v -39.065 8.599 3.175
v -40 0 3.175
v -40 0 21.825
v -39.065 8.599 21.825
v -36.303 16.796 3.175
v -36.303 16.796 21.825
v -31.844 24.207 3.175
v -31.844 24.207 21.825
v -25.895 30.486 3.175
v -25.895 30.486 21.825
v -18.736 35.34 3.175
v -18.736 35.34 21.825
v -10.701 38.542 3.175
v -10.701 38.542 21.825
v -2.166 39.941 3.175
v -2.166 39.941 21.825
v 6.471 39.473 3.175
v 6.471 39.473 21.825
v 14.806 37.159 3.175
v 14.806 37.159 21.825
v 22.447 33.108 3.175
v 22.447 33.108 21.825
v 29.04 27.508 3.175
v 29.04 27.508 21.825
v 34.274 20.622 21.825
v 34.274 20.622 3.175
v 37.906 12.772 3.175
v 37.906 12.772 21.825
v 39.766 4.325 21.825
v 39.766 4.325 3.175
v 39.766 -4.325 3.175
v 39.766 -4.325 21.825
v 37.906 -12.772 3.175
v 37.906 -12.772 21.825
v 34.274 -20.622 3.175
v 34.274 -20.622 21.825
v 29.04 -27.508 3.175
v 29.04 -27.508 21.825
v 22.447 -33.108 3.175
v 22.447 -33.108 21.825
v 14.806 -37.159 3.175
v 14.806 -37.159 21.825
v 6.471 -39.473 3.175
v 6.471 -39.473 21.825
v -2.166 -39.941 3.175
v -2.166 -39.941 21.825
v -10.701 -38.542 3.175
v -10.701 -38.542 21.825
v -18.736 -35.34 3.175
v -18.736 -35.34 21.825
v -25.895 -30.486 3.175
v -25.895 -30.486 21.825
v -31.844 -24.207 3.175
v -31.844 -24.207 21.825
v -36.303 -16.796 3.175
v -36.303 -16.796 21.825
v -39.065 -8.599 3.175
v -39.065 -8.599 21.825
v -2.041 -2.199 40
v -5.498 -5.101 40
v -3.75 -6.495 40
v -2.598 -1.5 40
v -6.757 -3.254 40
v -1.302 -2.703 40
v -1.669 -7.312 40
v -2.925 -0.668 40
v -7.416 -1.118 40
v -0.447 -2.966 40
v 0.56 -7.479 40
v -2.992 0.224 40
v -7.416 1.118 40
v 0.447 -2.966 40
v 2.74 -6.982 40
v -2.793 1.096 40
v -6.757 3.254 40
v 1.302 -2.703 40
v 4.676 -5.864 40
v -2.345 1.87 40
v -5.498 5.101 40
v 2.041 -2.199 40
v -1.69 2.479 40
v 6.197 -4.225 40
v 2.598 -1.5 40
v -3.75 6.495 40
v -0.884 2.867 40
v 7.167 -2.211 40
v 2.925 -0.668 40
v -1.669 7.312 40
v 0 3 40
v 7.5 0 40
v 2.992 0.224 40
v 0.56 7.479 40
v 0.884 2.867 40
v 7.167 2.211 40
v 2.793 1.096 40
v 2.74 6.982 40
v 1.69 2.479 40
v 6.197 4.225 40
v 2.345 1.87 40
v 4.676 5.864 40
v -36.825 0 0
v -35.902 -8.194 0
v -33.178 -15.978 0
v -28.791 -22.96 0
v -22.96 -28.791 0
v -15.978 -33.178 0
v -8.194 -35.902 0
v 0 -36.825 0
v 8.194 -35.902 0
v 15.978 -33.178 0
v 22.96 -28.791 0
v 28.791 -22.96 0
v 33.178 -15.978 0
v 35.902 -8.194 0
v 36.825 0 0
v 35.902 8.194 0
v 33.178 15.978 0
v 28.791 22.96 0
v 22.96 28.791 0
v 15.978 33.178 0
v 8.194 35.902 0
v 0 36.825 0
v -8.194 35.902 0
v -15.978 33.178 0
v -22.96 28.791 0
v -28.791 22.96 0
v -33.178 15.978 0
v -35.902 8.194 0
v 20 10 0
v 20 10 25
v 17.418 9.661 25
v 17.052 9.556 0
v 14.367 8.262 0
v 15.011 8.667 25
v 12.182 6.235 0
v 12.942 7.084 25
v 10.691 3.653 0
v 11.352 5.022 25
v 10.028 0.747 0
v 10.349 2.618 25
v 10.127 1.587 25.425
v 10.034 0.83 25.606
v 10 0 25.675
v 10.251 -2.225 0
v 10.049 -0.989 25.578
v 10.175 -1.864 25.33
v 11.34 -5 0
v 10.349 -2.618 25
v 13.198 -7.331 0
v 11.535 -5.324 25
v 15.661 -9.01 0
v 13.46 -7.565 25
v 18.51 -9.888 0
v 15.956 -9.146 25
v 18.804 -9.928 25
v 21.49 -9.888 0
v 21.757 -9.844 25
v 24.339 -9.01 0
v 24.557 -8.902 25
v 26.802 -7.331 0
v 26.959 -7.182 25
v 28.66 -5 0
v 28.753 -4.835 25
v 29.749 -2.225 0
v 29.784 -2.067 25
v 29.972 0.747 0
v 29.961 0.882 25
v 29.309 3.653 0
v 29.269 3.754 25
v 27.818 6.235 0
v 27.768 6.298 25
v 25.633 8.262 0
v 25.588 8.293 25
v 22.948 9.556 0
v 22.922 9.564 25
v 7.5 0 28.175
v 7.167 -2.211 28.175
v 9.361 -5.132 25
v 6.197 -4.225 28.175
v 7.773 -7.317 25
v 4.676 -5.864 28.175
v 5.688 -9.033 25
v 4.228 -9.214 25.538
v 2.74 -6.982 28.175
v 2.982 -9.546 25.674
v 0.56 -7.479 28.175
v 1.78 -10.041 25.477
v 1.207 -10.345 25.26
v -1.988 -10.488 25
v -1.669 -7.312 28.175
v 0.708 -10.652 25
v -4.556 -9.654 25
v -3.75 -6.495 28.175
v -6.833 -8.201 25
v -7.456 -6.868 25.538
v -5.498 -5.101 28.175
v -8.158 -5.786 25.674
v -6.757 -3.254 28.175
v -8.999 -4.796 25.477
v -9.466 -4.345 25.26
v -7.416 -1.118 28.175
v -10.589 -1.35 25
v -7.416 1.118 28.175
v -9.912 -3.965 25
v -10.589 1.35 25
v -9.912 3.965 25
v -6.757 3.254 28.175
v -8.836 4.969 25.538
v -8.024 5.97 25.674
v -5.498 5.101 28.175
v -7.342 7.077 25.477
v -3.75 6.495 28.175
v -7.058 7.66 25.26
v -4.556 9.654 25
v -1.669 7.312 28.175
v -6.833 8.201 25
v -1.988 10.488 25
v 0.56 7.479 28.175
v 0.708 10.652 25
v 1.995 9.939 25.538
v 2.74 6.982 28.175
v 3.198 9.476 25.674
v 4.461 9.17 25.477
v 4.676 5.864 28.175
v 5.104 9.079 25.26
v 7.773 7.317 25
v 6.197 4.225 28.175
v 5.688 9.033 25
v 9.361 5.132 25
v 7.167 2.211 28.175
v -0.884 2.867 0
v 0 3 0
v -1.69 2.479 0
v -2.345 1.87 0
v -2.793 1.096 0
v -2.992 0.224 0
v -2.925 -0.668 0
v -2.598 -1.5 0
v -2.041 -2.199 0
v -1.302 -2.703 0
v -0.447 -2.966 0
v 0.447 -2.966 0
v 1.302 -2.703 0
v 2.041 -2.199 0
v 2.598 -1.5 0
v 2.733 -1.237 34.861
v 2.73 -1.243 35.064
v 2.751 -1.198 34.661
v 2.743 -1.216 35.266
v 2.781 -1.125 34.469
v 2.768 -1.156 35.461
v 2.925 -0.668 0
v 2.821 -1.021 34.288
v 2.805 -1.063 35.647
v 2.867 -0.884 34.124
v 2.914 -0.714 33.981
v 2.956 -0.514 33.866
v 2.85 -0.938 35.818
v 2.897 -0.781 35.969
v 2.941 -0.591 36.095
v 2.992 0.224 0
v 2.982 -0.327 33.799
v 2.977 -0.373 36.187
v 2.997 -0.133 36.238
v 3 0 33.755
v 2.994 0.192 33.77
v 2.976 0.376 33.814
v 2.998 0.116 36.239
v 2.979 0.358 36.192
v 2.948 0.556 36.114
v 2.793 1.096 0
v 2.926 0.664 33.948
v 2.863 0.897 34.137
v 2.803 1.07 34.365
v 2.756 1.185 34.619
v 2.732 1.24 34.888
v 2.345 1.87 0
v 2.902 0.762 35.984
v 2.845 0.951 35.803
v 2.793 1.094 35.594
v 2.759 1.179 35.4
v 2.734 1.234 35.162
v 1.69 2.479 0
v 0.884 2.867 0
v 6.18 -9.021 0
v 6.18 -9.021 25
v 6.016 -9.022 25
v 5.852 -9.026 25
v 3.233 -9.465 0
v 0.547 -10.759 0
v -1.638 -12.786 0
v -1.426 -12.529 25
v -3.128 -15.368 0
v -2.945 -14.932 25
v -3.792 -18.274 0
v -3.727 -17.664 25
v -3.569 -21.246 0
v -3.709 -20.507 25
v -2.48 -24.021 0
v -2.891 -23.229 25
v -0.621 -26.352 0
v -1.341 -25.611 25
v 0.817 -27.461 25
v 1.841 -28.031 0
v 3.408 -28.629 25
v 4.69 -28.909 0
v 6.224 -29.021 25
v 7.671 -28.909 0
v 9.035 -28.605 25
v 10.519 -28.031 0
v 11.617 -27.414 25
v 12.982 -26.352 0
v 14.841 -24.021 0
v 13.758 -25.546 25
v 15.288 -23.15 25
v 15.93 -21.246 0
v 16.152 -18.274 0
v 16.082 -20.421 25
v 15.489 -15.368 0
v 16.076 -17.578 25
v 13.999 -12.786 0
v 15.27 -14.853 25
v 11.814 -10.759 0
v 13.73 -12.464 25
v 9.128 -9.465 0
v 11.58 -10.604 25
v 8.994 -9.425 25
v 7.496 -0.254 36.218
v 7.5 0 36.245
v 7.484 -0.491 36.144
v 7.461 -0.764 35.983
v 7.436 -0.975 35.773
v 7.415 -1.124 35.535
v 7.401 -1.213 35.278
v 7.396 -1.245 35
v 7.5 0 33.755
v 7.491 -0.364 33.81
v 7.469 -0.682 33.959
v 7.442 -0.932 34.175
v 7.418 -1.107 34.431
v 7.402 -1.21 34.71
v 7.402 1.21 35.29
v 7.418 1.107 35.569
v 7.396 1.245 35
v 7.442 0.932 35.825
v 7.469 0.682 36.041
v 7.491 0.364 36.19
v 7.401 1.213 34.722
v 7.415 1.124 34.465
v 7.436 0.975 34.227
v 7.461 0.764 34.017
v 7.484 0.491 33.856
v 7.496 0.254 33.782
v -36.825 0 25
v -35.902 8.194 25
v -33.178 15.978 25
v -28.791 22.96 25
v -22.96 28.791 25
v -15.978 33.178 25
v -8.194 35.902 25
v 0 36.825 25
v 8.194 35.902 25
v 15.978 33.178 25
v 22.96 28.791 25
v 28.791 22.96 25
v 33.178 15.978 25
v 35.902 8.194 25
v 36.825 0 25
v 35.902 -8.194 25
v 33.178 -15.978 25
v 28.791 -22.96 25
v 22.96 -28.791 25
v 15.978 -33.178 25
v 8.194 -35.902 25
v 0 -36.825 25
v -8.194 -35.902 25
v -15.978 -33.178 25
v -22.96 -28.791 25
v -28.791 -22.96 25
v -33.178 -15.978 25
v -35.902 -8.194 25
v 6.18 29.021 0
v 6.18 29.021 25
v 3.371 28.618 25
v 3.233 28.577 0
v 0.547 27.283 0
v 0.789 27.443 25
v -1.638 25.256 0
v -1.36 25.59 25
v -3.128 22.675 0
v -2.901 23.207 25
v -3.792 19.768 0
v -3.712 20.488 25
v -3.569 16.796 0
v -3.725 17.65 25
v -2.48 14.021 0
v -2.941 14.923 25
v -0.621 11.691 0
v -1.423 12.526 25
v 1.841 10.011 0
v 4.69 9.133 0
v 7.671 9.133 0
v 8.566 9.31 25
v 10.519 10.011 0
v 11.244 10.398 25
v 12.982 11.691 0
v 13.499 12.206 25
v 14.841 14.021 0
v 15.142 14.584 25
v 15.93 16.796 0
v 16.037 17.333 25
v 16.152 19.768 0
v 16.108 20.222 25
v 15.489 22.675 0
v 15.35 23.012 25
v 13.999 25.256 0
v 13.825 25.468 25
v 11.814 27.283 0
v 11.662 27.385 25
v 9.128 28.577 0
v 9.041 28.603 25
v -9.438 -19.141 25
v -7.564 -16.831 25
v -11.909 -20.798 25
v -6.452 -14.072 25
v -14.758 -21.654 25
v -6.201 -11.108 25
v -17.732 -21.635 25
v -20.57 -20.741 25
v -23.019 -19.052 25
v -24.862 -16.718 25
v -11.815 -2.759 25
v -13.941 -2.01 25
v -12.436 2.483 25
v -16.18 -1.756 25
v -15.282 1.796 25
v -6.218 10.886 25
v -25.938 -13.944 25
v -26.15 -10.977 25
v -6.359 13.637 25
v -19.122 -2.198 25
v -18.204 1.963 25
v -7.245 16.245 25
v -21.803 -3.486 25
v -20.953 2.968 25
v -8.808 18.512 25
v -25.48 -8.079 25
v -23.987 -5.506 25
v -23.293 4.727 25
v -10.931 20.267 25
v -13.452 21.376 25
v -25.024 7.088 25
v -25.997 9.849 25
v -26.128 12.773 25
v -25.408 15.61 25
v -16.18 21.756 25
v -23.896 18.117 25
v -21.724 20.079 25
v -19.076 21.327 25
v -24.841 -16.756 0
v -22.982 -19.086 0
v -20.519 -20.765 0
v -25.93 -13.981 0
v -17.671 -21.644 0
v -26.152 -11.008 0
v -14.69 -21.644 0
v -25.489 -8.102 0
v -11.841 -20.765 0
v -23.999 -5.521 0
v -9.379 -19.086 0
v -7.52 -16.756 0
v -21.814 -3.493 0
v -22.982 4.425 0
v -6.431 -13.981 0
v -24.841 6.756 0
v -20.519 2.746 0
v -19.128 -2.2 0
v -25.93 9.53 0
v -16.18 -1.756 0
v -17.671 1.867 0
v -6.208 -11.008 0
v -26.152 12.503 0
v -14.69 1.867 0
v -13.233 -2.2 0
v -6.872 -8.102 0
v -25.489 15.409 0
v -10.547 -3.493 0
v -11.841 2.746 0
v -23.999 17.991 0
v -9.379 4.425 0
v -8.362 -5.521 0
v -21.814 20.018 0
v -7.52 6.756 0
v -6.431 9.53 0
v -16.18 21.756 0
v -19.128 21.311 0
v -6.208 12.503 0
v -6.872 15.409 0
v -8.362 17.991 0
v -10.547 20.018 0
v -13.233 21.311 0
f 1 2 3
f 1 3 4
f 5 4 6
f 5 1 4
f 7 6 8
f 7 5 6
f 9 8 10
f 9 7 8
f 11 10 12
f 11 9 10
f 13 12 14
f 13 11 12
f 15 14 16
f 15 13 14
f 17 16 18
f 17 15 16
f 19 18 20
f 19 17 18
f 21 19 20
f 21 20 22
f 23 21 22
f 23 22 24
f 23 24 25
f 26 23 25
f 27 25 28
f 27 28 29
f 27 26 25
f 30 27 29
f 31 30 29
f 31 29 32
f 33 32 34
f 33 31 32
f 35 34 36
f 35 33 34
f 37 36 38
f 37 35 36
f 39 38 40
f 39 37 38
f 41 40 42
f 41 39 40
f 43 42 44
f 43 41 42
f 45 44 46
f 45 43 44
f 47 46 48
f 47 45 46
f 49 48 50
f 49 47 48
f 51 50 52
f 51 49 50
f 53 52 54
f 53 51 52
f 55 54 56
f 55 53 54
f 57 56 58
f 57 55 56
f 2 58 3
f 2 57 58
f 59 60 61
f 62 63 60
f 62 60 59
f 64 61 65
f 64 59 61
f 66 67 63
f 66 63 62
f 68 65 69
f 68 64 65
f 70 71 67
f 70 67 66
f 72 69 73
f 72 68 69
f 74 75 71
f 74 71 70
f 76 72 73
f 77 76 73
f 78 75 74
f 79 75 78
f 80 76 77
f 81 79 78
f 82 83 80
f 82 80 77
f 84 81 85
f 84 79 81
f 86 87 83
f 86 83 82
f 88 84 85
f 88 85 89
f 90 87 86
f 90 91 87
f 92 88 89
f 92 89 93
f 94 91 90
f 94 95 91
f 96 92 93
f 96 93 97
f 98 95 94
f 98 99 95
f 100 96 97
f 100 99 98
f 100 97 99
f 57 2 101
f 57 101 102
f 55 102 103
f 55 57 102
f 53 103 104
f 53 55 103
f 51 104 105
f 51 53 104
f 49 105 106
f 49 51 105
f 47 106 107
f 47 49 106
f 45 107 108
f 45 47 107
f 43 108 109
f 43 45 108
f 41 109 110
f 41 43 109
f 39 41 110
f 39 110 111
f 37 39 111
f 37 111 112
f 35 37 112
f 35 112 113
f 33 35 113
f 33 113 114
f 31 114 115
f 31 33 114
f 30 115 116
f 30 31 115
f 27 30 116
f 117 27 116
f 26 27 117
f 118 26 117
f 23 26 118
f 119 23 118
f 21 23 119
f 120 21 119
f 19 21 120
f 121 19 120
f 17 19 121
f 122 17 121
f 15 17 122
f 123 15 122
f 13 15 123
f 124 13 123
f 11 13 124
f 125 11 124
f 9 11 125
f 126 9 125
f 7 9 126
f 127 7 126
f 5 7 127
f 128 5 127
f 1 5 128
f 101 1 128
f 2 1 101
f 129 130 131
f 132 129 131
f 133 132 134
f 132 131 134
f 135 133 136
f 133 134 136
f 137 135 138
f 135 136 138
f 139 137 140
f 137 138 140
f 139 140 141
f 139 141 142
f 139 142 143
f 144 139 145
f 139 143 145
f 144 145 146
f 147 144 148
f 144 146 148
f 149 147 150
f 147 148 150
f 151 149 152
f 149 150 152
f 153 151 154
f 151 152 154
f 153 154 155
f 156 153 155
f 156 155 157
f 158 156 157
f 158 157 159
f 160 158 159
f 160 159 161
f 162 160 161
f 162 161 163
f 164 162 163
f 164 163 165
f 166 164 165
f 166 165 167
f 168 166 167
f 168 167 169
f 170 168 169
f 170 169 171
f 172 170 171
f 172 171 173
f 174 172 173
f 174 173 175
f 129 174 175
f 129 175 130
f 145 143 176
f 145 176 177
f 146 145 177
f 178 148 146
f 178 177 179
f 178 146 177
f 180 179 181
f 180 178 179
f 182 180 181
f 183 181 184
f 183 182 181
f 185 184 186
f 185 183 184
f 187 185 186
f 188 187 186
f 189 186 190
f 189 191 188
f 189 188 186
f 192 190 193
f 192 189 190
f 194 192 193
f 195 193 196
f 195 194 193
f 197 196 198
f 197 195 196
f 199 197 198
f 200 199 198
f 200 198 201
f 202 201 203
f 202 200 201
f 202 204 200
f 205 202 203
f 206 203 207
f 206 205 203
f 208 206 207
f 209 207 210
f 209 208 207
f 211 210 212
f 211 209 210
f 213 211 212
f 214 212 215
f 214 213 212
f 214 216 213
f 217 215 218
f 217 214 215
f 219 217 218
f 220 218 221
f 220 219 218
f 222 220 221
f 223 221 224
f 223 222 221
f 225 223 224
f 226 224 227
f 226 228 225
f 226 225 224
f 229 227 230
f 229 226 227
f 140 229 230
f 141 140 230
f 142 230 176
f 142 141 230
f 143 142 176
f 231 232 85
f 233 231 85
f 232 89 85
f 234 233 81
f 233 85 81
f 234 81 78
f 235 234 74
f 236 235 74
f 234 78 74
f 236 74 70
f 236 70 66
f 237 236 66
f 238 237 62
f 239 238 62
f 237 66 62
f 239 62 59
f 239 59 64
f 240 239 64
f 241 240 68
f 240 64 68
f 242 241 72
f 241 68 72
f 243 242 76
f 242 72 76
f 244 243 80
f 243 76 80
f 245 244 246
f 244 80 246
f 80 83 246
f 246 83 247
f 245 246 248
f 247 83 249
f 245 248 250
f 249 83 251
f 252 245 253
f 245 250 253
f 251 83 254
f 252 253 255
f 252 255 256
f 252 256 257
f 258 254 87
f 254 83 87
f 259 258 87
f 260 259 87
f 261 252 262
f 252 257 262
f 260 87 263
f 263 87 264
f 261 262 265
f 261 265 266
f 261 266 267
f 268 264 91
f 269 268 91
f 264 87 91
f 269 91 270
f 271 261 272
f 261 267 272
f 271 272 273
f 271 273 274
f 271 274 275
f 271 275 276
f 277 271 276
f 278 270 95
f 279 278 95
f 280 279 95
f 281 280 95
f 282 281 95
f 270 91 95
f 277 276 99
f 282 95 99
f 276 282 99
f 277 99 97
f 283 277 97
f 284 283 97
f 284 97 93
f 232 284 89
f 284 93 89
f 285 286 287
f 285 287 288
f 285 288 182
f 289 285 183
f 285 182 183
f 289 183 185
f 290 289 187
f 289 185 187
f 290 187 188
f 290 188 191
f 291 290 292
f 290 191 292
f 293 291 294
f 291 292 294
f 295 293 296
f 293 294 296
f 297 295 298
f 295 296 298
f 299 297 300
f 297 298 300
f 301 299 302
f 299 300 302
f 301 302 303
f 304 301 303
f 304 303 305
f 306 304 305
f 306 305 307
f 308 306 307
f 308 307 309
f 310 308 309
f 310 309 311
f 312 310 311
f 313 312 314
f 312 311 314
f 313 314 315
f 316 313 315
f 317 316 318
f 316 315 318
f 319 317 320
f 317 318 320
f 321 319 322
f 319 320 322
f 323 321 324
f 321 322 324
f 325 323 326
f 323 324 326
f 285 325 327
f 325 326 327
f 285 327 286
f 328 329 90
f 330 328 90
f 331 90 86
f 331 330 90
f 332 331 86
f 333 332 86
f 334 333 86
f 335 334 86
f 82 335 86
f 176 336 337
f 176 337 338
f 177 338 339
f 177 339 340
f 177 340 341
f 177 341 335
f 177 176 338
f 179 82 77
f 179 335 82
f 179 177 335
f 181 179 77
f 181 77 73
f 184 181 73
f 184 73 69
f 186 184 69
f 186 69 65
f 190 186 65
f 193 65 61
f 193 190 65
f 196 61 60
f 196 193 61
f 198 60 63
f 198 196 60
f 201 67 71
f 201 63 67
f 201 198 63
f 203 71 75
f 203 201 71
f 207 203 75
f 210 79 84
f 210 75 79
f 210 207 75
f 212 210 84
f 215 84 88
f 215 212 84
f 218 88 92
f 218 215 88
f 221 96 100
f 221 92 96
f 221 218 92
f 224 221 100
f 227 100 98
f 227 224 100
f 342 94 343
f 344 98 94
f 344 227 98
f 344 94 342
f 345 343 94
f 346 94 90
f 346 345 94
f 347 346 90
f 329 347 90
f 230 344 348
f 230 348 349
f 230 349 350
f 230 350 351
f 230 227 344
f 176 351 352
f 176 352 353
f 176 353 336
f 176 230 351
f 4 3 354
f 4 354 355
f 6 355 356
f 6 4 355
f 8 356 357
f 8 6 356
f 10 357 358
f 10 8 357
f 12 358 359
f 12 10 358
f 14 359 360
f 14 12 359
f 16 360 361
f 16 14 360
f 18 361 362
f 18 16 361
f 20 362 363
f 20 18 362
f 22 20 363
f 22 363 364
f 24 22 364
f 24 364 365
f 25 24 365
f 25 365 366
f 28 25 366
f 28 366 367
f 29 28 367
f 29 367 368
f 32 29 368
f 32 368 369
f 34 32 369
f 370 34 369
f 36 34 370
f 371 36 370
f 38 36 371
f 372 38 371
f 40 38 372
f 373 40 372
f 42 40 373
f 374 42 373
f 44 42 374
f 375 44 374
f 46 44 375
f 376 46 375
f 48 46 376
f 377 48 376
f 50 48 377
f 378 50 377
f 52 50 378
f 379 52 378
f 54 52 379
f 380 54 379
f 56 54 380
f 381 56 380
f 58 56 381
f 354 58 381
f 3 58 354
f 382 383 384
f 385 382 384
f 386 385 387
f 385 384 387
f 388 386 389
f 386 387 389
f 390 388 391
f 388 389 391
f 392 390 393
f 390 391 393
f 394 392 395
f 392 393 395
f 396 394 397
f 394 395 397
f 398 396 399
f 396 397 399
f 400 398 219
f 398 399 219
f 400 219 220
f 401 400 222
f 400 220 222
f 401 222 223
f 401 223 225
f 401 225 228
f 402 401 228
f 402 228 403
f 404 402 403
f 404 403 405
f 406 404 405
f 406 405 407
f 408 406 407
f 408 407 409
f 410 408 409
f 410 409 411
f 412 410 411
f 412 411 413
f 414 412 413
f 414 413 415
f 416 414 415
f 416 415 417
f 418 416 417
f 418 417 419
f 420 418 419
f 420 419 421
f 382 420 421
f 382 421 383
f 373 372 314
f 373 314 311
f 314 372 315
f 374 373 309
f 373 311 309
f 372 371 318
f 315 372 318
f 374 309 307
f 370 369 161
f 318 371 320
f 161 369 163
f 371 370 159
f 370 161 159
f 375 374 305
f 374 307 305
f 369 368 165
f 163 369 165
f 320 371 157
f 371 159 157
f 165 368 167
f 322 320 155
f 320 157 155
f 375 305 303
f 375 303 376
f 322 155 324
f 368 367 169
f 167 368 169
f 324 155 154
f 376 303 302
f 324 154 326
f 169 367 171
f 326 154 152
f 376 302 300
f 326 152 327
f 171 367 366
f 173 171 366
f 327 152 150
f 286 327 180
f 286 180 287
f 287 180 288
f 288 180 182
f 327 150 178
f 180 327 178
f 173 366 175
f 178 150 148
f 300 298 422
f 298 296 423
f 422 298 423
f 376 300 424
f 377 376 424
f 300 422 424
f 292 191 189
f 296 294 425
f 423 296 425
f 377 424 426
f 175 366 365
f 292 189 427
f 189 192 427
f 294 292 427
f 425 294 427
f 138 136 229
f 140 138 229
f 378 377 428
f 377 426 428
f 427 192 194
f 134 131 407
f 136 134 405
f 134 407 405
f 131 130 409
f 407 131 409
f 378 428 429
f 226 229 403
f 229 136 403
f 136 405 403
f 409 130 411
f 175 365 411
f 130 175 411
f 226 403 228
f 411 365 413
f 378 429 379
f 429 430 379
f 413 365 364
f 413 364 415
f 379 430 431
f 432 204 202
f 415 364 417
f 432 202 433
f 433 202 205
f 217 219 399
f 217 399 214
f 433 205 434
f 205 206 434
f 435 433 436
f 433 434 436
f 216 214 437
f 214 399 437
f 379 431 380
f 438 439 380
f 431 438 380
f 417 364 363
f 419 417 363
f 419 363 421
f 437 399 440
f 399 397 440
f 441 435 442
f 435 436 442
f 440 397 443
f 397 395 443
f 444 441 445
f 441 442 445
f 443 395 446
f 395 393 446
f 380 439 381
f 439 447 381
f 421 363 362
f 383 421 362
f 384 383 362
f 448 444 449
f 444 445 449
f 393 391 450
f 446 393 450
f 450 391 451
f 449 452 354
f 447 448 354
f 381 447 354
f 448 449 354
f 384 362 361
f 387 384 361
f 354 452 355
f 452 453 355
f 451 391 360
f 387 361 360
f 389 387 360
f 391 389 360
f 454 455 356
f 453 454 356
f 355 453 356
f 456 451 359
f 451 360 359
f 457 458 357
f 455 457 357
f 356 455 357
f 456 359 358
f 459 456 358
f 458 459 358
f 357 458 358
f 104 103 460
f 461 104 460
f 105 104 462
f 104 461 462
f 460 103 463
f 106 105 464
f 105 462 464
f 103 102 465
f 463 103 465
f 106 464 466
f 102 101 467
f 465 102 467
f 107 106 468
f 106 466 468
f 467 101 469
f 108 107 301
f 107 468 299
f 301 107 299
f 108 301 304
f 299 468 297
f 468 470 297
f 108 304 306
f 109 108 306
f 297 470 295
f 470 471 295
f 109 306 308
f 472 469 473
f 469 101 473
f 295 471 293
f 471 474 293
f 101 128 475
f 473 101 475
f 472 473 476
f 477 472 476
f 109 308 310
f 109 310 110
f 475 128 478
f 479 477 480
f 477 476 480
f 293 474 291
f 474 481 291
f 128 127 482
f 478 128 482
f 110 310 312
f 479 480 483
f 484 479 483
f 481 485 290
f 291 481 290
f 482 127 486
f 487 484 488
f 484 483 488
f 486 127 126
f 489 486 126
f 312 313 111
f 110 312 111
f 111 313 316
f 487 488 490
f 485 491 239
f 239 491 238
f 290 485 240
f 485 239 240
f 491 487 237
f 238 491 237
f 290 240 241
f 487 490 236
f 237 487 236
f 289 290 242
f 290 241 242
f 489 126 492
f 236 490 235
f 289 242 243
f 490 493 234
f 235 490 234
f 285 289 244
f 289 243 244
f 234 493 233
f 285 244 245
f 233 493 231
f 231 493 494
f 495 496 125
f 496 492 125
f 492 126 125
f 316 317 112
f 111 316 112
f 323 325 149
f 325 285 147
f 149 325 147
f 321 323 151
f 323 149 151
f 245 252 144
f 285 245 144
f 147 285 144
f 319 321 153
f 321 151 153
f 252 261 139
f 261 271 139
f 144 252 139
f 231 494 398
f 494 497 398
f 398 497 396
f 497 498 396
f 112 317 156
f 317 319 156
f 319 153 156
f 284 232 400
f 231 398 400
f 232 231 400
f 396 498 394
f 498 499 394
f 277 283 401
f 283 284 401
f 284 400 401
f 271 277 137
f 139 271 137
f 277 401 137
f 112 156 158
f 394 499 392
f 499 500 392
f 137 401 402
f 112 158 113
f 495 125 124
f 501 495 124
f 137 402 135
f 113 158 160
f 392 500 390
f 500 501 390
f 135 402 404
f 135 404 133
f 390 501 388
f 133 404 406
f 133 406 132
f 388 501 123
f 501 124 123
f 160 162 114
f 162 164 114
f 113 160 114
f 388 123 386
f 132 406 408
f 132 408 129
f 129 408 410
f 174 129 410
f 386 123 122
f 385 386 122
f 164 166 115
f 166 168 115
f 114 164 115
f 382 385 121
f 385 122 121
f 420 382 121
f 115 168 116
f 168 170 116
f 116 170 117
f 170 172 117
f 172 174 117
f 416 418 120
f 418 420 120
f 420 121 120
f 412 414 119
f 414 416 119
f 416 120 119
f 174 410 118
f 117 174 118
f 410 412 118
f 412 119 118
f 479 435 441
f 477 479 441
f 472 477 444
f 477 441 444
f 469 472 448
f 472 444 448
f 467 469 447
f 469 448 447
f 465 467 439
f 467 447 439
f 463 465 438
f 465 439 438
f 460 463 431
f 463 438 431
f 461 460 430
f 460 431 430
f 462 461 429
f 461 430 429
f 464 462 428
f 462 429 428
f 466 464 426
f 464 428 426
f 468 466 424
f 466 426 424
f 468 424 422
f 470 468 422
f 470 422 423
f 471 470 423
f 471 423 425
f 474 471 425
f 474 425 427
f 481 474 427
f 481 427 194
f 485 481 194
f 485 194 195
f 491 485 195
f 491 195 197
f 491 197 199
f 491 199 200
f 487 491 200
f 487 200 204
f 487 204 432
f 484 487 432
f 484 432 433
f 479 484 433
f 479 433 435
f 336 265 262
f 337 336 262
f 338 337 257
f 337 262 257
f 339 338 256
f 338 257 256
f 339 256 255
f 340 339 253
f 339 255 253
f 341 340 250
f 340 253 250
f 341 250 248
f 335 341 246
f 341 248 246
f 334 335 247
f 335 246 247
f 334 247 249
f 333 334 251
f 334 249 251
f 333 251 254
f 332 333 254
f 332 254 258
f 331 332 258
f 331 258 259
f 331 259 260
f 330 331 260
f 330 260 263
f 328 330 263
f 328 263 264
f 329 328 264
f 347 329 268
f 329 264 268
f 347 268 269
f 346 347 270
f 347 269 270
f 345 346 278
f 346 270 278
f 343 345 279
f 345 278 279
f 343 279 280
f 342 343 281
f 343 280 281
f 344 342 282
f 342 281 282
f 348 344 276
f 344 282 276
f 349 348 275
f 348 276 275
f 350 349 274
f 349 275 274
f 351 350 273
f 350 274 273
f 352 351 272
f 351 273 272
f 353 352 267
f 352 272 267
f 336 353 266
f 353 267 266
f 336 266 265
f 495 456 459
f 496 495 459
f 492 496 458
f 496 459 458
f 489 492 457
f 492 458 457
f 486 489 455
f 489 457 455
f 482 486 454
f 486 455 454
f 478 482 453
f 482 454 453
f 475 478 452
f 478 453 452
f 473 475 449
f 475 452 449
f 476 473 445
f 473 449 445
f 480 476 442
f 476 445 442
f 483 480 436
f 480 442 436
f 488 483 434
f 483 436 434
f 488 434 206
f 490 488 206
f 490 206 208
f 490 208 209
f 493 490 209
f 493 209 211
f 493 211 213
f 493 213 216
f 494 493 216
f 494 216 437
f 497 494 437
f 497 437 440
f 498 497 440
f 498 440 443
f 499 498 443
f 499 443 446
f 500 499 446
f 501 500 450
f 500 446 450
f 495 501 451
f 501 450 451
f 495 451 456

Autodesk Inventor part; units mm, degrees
ref_plane "XZ Plane" through (0, 0, 0) normal (0, 1, 0) x (-1, 0, 0)
ref_plane "XY Plane" through (0, 0, 0) normal (0, 0, 1) x (1, 0, 0)
sketch "Boceto1" plane through (0, 0, 0) normal (0, 0, 1) x (1, 0, 0)
  circle A0 centre (0, 0) radius 3
  circle A1 centre (0, 0) radius 7.5
  circle A2 centre (0, 0) radius 127
  circle A3 centre (0, 0) radius 31.75 construction
  dimension "d0" = 6
  dimension "d1" = 15
  dimension "d2" = 254
  dimension "d3" = 63.5
extrude "Extrusión1" add sketch "Boceto1" along normal blind 40 contours A1
sketch "Boceto2" plane through (0, 0, 0) normal (0, 0, -1) x (-1, 0, 0)
  circle A0 centre (0, 0) radius 40
  dimension "d6" = 80
extrude "Extrusión2" add sketch "Boceto2" against normal blind 25
ref_plane "Plano de trabajo1" through (7.5, 0, 0) normal (1, 0, 0) x (0, 1, 0)
sketch "Boceto5" plane through (7.5, 0, 0) normal (1, 0, 0) x (0, 1, 0)
  line L0 (7.5, 40) -> (-7.5, 40) projected
  line L1 (0, 40) -> (0, 35)
  point P0 (0, 0)
  dimension "d31" = 5
sketch "Boceto6" plane through (0, 0, 0) normal (0, 0, -1) x (-1, 0, 0)
  point P0 (0, 0)
  point P1 (0, 0)
hole "Agujero2" at (0, 0, 0) direction (0, 0, 1) diameter 6 end through all
hole "Agujero3" at (7.5, 0, 35) direction (-1, 0, 0) diameter 2.4892 depth 8 tip angle 118
sketch "Boceto7" plane through (0, 0, 0) normal (0, 0, -1) x (-1, 0, 0)
  line L0 (-40, 0) -> (-30, 0)
  line L1 (10, 0) -> (-10, 0)
  line L2 (-30, 0) -> (-10, 0)
  line L3 (-10, 0) -> (-20, 0)
  circle A0 centre (-20, 0) radius 10
  point P0 (0, 0)
  point P1 (-6.1803, -19.0211)
  point P2 (16.1803, -11.7557)
  point P3 (16.1803, 11.7557)
  point P4 (-6.1803, 19.0211)
  dimension "d48" = 10
  dimension "d49" = 40
  dimension "d50" = 20
  dimension "d51" = 20
  dimension "d52" = 10
  dimension "d55" = 360
hole "Agujero4" at (-16.1803, -11.7557, 0) at (6.1803, -19.0211, 0) at (20, 0, 0) at (6.1803, 19.0211, 0) at (-16.1803, 11.7557, 0) direction (0, 0, 1) diameter 20 end through all
chamfer "Chaflán1" distance 3.175 angle 45 1 edges at (-7.5, 0, 25)
chamfer "Chaflán2" distance 3.175 angle 45 2 edges at (40, 0, 25) (40, 0, 0)
properties part number "llantasumo" material "Plástico ABS"
